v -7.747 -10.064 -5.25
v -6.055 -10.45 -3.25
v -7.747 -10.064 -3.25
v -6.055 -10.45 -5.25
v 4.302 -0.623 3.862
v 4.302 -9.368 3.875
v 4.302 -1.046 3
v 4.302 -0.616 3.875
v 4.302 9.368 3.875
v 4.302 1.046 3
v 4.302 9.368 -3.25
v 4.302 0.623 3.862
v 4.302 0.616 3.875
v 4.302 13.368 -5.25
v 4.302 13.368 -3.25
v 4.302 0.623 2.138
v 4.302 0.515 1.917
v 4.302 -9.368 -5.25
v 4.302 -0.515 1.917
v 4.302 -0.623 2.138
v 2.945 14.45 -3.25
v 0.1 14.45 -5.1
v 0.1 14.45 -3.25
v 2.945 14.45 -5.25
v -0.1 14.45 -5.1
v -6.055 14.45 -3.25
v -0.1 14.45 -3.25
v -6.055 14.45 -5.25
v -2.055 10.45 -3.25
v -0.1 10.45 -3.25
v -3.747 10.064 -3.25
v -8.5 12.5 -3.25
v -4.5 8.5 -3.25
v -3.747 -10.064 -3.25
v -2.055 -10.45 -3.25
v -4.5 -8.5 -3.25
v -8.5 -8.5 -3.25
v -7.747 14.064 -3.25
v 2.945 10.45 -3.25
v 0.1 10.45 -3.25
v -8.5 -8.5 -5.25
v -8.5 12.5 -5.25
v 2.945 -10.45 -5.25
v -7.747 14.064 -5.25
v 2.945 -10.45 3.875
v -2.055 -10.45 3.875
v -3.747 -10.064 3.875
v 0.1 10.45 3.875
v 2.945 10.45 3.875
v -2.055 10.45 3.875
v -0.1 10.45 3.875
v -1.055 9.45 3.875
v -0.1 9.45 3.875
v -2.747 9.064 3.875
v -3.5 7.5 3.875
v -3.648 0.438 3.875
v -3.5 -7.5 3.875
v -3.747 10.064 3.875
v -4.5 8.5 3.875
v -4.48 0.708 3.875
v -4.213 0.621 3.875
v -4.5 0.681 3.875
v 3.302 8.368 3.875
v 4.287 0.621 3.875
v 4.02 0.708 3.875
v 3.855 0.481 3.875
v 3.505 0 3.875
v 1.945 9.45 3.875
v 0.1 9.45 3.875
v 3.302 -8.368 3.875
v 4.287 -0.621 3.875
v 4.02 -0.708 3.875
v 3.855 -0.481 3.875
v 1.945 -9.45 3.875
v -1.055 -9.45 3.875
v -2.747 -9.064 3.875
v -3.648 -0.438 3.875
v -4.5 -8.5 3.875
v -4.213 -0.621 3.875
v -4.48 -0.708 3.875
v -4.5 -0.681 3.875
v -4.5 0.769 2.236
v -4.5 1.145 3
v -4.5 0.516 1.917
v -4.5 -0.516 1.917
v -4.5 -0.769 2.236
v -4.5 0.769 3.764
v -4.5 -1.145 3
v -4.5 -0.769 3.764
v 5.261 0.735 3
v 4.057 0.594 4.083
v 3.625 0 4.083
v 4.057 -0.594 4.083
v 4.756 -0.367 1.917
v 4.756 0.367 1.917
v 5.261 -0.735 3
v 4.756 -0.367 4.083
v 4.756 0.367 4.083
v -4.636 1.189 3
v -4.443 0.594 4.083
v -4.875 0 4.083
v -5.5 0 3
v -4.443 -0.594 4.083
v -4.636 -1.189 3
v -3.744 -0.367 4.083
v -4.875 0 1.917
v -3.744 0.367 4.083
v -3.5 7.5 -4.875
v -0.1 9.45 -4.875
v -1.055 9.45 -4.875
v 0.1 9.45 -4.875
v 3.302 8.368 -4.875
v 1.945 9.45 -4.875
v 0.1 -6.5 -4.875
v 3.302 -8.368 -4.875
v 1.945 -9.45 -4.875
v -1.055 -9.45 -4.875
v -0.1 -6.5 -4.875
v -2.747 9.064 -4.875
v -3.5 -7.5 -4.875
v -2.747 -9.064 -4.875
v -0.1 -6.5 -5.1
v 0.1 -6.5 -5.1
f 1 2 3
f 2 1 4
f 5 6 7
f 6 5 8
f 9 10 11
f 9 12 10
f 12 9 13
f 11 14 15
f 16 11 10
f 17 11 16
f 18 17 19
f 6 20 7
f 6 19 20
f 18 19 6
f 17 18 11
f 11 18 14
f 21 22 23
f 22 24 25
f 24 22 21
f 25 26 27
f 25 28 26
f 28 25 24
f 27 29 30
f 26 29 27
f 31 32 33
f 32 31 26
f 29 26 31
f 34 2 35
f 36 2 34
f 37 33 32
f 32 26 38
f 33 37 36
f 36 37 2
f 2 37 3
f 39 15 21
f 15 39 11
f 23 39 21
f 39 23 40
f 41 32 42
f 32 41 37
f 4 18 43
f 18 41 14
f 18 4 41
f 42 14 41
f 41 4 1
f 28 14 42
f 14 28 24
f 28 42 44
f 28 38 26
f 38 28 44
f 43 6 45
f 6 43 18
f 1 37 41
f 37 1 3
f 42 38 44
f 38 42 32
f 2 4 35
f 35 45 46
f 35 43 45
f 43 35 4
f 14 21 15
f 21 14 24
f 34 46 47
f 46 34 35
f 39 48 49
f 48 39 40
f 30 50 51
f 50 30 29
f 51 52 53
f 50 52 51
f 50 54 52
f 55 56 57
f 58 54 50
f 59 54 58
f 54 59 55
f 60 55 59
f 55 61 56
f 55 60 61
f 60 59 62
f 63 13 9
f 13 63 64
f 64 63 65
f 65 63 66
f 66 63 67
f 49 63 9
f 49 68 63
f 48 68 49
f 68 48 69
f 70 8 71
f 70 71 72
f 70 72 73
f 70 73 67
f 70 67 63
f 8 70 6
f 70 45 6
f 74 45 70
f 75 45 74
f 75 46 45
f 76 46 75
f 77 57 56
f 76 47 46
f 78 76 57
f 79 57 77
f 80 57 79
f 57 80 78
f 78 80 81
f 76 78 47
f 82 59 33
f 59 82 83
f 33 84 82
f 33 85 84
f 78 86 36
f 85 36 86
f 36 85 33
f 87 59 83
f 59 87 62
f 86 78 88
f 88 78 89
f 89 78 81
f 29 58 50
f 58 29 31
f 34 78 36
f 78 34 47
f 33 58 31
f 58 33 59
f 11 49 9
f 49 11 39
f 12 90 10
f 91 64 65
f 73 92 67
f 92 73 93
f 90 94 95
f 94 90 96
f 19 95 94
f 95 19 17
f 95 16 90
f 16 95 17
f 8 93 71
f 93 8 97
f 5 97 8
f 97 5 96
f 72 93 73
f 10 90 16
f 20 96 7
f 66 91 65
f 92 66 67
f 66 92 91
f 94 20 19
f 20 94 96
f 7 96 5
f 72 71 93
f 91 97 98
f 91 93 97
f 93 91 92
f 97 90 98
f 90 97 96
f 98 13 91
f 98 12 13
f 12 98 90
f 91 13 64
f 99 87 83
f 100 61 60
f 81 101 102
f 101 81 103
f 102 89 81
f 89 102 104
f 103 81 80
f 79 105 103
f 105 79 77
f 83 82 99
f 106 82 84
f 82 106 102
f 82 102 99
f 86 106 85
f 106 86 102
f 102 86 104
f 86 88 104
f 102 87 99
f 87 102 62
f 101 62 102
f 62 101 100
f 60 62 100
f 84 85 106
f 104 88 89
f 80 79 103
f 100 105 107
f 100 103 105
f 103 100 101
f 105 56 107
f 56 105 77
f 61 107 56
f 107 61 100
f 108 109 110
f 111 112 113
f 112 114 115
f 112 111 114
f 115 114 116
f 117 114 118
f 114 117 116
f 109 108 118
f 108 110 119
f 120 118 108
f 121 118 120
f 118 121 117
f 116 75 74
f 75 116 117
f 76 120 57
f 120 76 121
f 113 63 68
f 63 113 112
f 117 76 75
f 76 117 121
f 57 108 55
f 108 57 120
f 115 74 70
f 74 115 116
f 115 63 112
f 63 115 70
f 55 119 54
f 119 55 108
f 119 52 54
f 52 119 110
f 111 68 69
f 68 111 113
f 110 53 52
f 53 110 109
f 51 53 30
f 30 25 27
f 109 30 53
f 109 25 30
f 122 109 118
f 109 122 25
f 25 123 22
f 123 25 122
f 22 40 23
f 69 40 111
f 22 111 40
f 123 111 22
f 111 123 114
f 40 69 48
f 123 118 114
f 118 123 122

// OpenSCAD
//Bibo Gromets
//GrometType=2 BackRight(YZStepper) BiboRightBackGromet.stl
//   9x20x8.5, Rounding=2,GrommetThick=1,Offx=2,Offy=2,FlangeThick=1,FlangeShoulder=2,Detent=1.5

//GrometType=1 FrontLeft(Empty) BiboLeftFrontGromet.stl
//   9x21x8.5, Rounding=2,GrommetThick=1,Offx=2,Offy=2,FlangeThick=2,FlangeShoulder=2,Detent=1.5

//GrometType=3 BackLeft(X EndStop) BiboLeftBackGromet.stl
//   9x13x8.5, Rounding=2,GrommetThick=1,Offx=0,Offy=2,FlangeThick=1,FlangeShoulder=2,Detent=1.5

//5 BackMiddle(Empty) BiboMiddleBackGromet.stl
//   9x28x8.5, Rounding=2,GrommetThick=1,Offx=2,Offy=0,FlangeThick=1,FlangeShoulder=2,Detent=1.5
//4 BedHeaterWires BiboBedHeaterGromet.stl
//   5x64x4.5, Rounding=2,GrommetThick=1,Offx=0,Offy=0,FlangeThick=1,FlangeShoulder=2,Detent=1.5
//GrometType 1-FrontLeft,2-BackRight,3-BackLeft,4-BedHeatNotComplete,5-BackMiddle
GrometType=1; 
//GrometType,Version,HoleX,HoleY,HoleZ,HoleRounding,GrommetThickness,TopFlangeXOff,TopFlangeYOff,TopFlangeThick,TopFlangeShoulder,Detent

if (GrometType==5) { 
    Version="BackMiddle";
    //HoleSizeX
    HoleX=9;
    //HoleSizeY
    HoleY=28;
    //Plate thickness
    HoleZ=9.5;
    //Round it up a bit so it will fit better
    HoleRounding=2;
    HoleRounding2=HoleRounding*2;
    GrommetThickness=1 ;
    GrommetThickness2=GrommetThickness*2 ;
    //TopFlange
    TopFlangeXOff=2;
    TopFlangeYOff=0;
    TopFlangeThick=1;
    TopFlangeShoulder=2;
    //DetentSize
    Detent=1.75;
    Gromet(GrometType,Version,HoleX,HoleY,HoleZ,HoleRounding,GrommetThickness,TopFlangeXOff,TopFlangeYOff,TopFlangeThick,TopFlangeShoulder,Detent);
};

if (GrometType==4) { 
    Version= (GrometType==4) ? "BedHeaterWires":"";
    //Version="BedHeaterWires";
    //HoleSizeX
    HoleX=5;
    //HoleSizeY
    HoleY=64;
    //Plate thickness
    HoleZ=4.5;
    //Round it up a bit so it will fit better
    //if (HoleX<6) HoleRounding=1; 
    //if (HoleX<6) HoleRounding=2;
    HoleRounding = (HoleX<6) ? 1 : 2;
    //xx = (x > (y-z)) ? x : y-z;
    //c= a>b ? b-w : (a<b ? a-w : a-w);

    GrommetThickness=1 ;
    //TopFlange
    TopFlangeXOff=0;
    TopFlangeYOff=0;
    TopFlangeThick=1;
    TopFlangeShoulder=2;
    //DetentSize
    Detent=1.75;
    Gromet(GrometType,Version,HoleX,HoleY,HoleZ,HoleRounding,GrommetThickness,TopFlangeXOff,TopFlangeYOff,TopFlangeThick,TopFlangeShoulder,Detent);
};

if (GrometType==3) { 
    Version="BackLeft";
    //HoleSizeX
    HoleX=8.5;
    //HoleSizeY
    HoleY=13;
    //Plate thickness
    HoleZ=9.5;
    //Round it up a bit so it will fit better
    HoleRounding=2;
    HoleRounding2=HoleRounding*2;
    GrommetThickness=1 ;
    GrommetThickness2=GrommetThickness*2 ;
    //TopFlange
    TopFlangeXOff=2;
    TopFlangeYOff=0;
    TopFlangeThick=1;
    TopFlangeShoulder=2;
    //DetentSize
    Detent=1.75;
    Gromet(GrometType,Version,HoleX,HoleY,HoleZ,HoleRounding,GrommetThickness,TopFlangeXOff,TopFlangeYOff,TopFlangeThick,TopFlangeShoulder,Detent);
};
if (GrometType==2) { 
    Version="BackRight";
    //HoleSizeX
    HoleX=9;
    //HoleSizeY
    HoleY=20;
    //Plate thickness
    HoleZ=9.5;
    //Round it up a bit so it will fit better
    HoleRounding=2;
    HoleRounding2=HoleRounding*2;
    GrommetThickness=1 ;
    GrommetThickness2=GrommetThickness*2 ;
    //TopFlange
    TopFlangeXOff=2;
    TopFlangeYOff=1;
    TopFlangeThick=1;
    TopFlangeShoulder=2;
    //DetentSize
    Detent=1.75;
    Gromet(GrometType,Version,HoleX,HoleY,HoleZ,HoleRounding,GrommetThickness,TopFlangeXOff,TopFlangeYOff,TopFlangeThick,TopFlangeShoulder,Detent);
};

if (GrometType==1) {
    Version="FrontLeft";
    //HoleSizeX
    HoleX=9;
    //HoleSizeY
    HoleY=21;
    //Plate thickness
    HoleZ=8.5;
    //Round it up a bit so it will fit better
    HoleRounding=2;
    HoleRounding2=HoleRounding*2;
    GrommetThickness=1 ;
    GrommetThickness2=GrommetThickness*2 ;
    //TopFlange
    TopFlangeXOff=2;
    TopFlangeYOff=2;
    TopFlangeThick=2;
    TopFlangeShoulder=2;
    //DetentSize
    Detent=1.25;
    Gromet(GrometType,Version,HoleX,HoleY,HoleZ,HoleRounding,GrommetThickness,TopFlangeXOff,TopFlangeYOff,TopFlangeThick,TopFlangeShoulder,Detent);
};


// 8x20x6.5
module Gromet(GrometType,Version,HoleX,HoleY,HoleZ,HoleRounding,GrommetThickness,TopFlangeXOff,TopFlangeYOff,TopFlangeThick,TopFlangeShoulder,Detent) {
//Adjustments
    HoleRounding2=HoleRounding*2;
    GrommetThickness2=GrommetThickness*2 ;
    echo ("HoleZ",HoleZ);
    aHoleZ=HoleZ-.75;

rotate([0,180,0]) { 
difference(){  //cut slice

    difference() {
union() {
    union() {
    union() {
        //topflange
        translate([TopFlangeXOff,TopFlangeYOff,HoleZ/2]) {
        RoundSquare((HoleX+(TopFlangeShoulder*2)),(HoleY+(TopFlangeShoulder*2)),TopFlangeThick,HoleRounding);
        }
        //build outer pipe
        RoundSquare(HoleX,HoleY,aHoleZ,HoleRounding);
    } 
         translate([-((HoleX/2)+GrommetThickness-Detent),0,(-HoleZ/2)+Detent]) {
       sphere(r=Detent);
        }
    }
        translate([(HoleX/2)+GrommetThickness-Detent,0,(-HoleZ/2)+Detent]) {
       sphere(r=Detent);
        }
    }
    translate([0,0,0]) {
    //build inner pipe
    RoundSquare(HoleX-GrommetThickness2,HoleY-GrommetThickness2,aHoleZ+2,HoleRounding);
    }
    };
    //slice to put wire in
    translate([0,4,0]) {
        cube([.2,HoleY,HoleZ*1.2],true);
    }
}
}
}  //Grommet end of moduile

//rotate(a=[0,90,0]) {
module RoundSquare(X,Y,Z,R) {
minkowski()
    {
    cube([X-(R*2),Y-(R*2),Z],true) ;
        cylinder(r=R,h=.001,center=true);
    }
}
//}
module BedHeaterWires(GrometType){
   //if (GrometType==4) { 
    Version= (GrometType==4) ? "BedHeaterWires":"";
    //Version="BedHeaterWires";
    //HoleSizeX
    HoleX=5;
    //HoleSizeY
    HoleY=64;
    //Plate thickness
    HoleZ=4.5;
    //Round it up a bit so it will fit better
    //if (HoleX<6) HoleRounding=1; 
    //if (HoleX<6) HoleRounding=2;
    HoleRounding = (HoleX<6) ? 1 : 2;
    //xx = (x > (y-z)) ? x : y-z;
    //c= a>b ? b-w : (a<b ? a-w : a-w);
    HoleRounding2=HoleRounding*2;
    GrommetThickness=1 ;
    GrommetThickness2=GrommetThickness*2 ;
    //TopFlange
    TopFlangeXOff=0;
    TopFlangeYOff=0;
    TopFlangeThick=1;
    TopFlangeShoulder=2;
    //DetentSize
    Detent=1.75;
    }
